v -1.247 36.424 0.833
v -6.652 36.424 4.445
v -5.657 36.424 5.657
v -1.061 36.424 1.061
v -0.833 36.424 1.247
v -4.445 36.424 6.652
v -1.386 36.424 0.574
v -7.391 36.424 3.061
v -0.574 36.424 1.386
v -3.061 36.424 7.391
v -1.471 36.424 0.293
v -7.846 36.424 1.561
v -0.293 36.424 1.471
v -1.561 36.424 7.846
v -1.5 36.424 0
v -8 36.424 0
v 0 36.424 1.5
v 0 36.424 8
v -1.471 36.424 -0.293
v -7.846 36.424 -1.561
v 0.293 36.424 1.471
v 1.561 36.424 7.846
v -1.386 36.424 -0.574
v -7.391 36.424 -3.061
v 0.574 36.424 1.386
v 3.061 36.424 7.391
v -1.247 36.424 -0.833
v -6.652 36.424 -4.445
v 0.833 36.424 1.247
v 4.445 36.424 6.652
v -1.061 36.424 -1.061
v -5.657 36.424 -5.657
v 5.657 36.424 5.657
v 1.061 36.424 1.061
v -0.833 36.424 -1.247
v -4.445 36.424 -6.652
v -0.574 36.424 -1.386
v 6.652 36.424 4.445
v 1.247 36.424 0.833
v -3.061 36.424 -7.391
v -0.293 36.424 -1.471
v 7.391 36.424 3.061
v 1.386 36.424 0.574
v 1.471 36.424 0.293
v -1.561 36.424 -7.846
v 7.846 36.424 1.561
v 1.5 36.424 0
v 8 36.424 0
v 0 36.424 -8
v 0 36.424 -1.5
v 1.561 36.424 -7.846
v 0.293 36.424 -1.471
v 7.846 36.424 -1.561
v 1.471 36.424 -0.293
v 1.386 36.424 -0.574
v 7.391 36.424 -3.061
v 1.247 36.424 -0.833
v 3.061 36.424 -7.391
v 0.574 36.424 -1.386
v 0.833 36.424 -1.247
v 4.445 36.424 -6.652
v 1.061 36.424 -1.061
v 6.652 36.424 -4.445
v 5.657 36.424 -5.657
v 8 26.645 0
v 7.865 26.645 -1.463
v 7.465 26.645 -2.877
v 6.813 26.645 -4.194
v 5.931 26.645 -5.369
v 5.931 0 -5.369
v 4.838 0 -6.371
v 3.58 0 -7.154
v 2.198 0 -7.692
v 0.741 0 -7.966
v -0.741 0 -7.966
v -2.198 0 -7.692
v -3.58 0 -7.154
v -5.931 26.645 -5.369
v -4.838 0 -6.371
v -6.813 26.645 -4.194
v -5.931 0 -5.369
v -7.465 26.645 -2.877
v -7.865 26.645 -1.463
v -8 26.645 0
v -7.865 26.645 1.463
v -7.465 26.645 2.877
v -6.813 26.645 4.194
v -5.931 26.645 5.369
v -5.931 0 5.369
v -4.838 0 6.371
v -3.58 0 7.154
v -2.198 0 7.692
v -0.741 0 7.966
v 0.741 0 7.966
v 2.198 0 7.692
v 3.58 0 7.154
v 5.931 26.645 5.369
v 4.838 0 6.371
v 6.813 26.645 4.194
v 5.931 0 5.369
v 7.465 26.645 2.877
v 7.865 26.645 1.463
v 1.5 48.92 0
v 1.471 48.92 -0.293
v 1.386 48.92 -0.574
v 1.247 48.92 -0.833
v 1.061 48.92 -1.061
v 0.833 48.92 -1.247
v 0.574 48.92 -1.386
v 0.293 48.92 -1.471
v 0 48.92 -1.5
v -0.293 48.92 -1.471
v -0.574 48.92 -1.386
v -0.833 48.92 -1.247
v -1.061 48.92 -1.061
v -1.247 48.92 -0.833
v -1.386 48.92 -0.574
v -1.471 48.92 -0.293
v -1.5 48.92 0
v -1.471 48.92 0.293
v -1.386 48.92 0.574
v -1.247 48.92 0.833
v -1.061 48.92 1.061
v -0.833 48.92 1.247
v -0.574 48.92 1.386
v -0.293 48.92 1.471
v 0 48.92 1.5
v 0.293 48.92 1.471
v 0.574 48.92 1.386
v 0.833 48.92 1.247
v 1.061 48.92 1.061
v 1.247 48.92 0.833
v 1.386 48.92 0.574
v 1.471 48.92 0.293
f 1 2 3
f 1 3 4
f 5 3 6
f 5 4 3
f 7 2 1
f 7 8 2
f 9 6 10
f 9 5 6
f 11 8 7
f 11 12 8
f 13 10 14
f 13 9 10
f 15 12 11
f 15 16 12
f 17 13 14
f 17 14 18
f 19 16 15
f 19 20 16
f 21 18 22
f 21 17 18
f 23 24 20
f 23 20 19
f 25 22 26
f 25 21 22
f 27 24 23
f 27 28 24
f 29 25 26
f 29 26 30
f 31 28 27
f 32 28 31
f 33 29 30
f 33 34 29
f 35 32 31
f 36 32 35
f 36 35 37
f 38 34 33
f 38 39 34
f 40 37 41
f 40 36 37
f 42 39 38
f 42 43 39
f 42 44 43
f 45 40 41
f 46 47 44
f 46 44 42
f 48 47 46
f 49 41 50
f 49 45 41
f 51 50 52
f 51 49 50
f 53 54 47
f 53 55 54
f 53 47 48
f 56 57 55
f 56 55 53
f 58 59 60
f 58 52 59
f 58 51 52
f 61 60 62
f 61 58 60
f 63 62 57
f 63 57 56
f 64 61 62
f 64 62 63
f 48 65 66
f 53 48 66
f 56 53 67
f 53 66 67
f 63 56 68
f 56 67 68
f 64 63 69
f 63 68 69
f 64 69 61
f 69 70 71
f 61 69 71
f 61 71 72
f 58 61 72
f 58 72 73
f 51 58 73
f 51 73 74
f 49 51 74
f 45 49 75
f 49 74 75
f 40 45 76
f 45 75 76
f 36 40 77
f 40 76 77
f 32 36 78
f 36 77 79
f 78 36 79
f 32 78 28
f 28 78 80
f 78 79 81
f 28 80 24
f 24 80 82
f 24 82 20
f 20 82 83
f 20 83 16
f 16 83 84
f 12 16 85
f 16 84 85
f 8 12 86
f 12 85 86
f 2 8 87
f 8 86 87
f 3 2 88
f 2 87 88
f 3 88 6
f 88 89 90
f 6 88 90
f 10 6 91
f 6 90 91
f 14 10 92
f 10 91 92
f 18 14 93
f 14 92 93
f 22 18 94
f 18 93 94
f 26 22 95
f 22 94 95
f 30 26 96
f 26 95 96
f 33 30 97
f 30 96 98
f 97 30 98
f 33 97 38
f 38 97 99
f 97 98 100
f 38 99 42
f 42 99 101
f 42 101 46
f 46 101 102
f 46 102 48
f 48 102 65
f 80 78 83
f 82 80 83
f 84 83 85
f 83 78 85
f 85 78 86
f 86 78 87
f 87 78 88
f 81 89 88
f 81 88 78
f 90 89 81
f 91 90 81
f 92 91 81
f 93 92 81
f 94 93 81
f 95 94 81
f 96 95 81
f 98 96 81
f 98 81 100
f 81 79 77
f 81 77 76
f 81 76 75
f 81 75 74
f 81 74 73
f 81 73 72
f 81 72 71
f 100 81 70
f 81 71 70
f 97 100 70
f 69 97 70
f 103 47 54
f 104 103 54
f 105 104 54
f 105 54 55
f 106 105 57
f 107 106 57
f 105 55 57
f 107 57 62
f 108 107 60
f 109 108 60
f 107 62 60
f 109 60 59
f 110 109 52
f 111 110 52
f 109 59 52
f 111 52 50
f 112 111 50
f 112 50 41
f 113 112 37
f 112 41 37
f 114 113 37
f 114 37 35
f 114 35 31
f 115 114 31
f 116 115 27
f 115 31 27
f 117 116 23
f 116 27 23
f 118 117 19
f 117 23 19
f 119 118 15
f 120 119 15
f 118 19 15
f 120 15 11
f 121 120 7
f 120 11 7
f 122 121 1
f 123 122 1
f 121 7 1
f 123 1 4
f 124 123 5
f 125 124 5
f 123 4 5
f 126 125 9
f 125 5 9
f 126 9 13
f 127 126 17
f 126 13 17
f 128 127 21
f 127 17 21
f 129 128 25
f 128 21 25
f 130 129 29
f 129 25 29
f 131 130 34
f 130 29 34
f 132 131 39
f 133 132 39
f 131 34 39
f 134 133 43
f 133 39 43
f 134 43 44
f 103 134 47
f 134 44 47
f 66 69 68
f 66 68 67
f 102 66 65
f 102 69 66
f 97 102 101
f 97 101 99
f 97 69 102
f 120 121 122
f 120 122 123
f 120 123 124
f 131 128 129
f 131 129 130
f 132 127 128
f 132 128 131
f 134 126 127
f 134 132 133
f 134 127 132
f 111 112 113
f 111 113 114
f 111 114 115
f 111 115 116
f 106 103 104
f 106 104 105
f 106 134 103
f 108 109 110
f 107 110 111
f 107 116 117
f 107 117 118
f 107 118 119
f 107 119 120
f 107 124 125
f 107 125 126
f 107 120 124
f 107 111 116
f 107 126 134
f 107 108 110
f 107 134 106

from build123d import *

# Parameters (mm, degrees)
SKETCH1_R           = 8
BOSS_EXTRUDE1_DEPTH = 36.4236
CUT_EXTRUDE1_DEPTH  = 26.6446
SKETCH3_R           = 1.5
BOSS_EXTRUDE2_DEPTH = 12.4968


with BuildPart() as part:
    # Sketch1 → Boss-Extrude1 (new body)
    with BuildSketch(Plane(origin=(0, 0, 0), x_dir=(1, 0, 0), z_dir=(0, 1, 0))):
        Circle(SKETCH1_R)
    extrude(amount=BOSS_EXTRUDE1_DEPTH)

    # Sketch2 → Cut-Extrude1 (cut)
    with BuildSketch(Plane.XZ):
        with BuildLine():
            Line((5.9309, 5.368838346), (5.9309, -5.368838346))
            ThreePointArc((5.9309, -5.368838346), (8, 0), (5.9309, 5.368838346))
        make_face()
        with BuildLine():
            Line((-5.9309, 5.368838346), (-5.9309, -5.368838346))
            ThreePointArc((-5.9309, -5.368838346), (-8, 0), (-5.9309, 5.368838346))
        make_face()
    extrude(amount=-CUT_EXTRUDE1_DEPTH, mode=Mode.SUBTRACT)

    # Sketch3 → Boss-Extrude2 (add)
    with BuildSketch(Plane(origin=(0, 36.4236, 0), x_dir=(1, 0, 0), z_dir=(0, 1, 0))):
        Circle(SKETCH3_R)
    extrude(amount=BOSS_EXTRUDE2_DEPTH)


solid = part.part
